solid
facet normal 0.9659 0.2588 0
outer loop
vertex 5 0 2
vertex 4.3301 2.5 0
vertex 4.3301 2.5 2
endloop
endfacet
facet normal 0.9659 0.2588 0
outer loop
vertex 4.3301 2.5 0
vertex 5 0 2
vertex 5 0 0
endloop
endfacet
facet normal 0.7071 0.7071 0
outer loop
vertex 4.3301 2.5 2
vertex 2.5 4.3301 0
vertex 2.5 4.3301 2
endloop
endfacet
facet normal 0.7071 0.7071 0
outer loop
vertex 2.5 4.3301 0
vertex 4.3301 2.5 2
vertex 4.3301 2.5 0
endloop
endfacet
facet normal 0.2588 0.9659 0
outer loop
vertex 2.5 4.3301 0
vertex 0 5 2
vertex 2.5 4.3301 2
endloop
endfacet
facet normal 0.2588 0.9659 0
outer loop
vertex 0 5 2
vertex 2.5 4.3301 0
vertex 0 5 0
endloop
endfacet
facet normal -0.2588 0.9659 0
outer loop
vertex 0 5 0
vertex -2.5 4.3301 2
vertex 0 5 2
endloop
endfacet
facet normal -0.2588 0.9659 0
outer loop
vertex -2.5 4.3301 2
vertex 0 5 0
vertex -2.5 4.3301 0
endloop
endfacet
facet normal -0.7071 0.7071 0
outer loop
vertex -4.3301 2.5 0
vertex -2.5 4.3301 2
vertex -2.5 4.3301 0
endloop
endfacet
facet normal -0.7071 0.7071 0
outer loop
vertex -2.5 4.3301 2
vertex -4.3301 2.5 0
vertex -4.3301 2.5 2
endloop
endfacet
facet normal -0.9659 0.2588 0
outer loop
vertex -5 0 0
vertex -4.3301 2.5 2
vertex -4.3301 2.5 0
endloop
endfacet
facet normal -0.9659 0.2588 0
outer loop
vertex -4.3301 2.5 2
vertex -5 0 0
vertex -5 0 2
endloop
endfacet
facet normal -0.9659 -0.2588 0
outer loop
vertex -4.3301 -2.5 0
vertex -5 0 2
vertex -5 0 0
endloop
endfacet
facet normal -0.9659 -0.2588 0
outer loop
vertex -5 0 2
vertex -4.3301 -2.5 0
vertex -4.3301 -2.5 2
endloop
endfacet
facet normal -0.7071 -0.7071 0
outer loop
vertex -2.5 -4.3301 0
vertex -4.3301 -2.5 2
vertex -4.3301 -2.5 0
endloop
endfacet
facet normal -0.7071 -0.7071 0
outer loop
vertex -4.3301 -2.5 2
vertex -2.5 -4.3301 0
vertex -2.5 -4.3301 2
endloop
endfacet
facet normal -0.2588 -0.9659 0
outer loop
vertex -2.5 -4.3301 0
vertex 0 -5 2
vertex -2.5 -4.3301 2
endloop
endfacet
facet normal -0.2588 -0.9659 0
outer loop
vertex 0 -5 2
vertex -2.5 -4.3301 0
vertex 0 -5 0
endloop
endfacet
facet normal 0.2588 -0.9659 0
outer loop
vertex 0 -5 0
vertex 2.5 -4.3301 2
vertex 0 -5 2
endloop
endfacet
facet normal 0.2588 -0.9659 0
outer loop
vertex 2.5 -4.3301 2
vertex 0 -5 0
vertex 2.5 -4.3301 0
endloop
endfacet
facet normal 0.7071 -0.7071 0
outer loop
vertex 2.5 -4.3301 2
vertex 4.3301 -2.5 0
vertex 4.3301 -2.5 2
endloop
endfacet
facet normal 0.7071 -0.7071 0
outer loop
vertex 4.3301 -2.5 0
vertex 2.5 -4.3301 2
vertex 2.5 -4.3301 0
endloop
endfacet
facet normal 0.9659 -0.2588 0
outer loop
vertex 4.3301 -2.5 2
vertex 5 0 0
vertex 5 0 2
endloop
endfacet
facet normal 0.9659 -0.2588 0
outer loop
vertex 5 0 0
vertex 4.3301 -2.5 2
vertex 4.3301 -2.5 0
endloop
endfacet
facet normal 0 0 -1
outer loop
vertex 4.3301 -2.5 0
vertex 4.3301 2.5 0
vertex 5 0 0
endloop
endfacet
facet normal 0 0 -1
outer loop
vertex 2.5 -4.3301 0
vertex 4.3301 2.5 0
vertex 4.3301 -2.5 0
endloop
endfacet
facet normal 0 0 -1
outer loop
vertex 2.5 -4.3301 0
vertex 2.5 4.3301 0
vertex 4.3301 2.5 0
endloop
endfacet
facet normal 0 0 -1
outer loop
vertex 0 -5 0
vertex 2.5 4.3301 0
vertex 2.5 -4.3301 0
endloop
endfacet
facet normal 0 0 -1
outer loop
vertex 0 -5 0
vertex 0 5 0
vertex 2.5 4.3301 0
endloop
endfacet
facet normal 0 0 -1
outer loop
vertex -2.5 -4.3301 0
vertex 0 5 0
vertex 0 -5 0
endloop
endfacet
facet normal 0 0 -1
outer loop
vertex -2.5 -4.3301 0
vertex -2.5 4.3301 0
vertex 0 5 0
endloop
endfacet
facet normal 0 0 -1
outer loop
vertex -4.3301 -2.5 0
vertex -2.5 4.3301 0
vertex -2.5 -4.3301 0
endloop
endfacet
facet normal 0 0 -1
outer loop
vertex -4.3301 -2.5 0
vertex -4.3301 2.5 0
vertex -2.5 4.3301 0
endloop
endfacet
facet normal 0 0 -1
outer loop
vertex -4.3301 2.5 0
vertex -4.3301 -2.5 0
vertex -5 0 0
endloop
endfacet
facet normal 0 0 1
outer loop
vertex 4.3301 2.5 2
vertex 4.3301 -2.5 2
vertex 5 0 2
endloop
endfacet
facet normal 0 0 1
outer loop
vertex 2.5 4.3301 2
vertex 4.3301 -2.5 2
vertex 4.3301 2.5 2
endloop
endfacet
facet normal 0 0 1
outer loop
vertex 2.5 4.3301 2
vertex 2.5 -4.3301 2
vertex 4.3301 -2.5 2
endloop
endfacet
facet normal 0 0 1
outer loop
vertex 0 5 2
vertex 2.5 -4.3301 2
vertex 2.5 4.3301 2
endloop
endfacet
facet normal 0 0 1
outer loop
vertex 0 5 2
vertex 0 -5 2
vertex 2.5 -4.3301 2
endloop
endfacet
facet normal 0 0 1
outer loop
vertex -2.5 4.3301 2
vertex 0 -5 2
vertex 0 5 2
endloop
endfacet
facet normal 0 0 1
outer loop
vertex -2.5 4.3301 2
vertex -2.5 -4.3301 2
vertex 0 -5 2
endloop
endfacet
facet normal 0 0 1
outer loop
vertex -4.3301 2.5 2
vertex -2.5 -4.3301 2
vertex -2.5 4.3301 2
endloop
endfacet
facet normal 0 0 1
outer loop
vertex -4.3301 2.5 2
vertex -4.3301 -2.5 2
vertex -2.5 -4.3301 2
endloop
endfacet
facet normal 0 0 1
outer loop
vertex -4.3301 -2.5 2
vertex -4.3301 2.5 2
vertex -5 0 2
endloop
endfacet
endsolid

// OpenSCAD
// plate round 2x2

// external vars #########################

ext_scale = 1.0;
ext_fn = 12;

// part ##################################

module plate_round_2x2(m_scale=ext_scale,m_fn=ext_fn) {
    scale([m_scale,m_scale,m_scale])
    cylinder(h=2,d=10,center=false,$fn=m_fn);
}

plate_round_2x2();
